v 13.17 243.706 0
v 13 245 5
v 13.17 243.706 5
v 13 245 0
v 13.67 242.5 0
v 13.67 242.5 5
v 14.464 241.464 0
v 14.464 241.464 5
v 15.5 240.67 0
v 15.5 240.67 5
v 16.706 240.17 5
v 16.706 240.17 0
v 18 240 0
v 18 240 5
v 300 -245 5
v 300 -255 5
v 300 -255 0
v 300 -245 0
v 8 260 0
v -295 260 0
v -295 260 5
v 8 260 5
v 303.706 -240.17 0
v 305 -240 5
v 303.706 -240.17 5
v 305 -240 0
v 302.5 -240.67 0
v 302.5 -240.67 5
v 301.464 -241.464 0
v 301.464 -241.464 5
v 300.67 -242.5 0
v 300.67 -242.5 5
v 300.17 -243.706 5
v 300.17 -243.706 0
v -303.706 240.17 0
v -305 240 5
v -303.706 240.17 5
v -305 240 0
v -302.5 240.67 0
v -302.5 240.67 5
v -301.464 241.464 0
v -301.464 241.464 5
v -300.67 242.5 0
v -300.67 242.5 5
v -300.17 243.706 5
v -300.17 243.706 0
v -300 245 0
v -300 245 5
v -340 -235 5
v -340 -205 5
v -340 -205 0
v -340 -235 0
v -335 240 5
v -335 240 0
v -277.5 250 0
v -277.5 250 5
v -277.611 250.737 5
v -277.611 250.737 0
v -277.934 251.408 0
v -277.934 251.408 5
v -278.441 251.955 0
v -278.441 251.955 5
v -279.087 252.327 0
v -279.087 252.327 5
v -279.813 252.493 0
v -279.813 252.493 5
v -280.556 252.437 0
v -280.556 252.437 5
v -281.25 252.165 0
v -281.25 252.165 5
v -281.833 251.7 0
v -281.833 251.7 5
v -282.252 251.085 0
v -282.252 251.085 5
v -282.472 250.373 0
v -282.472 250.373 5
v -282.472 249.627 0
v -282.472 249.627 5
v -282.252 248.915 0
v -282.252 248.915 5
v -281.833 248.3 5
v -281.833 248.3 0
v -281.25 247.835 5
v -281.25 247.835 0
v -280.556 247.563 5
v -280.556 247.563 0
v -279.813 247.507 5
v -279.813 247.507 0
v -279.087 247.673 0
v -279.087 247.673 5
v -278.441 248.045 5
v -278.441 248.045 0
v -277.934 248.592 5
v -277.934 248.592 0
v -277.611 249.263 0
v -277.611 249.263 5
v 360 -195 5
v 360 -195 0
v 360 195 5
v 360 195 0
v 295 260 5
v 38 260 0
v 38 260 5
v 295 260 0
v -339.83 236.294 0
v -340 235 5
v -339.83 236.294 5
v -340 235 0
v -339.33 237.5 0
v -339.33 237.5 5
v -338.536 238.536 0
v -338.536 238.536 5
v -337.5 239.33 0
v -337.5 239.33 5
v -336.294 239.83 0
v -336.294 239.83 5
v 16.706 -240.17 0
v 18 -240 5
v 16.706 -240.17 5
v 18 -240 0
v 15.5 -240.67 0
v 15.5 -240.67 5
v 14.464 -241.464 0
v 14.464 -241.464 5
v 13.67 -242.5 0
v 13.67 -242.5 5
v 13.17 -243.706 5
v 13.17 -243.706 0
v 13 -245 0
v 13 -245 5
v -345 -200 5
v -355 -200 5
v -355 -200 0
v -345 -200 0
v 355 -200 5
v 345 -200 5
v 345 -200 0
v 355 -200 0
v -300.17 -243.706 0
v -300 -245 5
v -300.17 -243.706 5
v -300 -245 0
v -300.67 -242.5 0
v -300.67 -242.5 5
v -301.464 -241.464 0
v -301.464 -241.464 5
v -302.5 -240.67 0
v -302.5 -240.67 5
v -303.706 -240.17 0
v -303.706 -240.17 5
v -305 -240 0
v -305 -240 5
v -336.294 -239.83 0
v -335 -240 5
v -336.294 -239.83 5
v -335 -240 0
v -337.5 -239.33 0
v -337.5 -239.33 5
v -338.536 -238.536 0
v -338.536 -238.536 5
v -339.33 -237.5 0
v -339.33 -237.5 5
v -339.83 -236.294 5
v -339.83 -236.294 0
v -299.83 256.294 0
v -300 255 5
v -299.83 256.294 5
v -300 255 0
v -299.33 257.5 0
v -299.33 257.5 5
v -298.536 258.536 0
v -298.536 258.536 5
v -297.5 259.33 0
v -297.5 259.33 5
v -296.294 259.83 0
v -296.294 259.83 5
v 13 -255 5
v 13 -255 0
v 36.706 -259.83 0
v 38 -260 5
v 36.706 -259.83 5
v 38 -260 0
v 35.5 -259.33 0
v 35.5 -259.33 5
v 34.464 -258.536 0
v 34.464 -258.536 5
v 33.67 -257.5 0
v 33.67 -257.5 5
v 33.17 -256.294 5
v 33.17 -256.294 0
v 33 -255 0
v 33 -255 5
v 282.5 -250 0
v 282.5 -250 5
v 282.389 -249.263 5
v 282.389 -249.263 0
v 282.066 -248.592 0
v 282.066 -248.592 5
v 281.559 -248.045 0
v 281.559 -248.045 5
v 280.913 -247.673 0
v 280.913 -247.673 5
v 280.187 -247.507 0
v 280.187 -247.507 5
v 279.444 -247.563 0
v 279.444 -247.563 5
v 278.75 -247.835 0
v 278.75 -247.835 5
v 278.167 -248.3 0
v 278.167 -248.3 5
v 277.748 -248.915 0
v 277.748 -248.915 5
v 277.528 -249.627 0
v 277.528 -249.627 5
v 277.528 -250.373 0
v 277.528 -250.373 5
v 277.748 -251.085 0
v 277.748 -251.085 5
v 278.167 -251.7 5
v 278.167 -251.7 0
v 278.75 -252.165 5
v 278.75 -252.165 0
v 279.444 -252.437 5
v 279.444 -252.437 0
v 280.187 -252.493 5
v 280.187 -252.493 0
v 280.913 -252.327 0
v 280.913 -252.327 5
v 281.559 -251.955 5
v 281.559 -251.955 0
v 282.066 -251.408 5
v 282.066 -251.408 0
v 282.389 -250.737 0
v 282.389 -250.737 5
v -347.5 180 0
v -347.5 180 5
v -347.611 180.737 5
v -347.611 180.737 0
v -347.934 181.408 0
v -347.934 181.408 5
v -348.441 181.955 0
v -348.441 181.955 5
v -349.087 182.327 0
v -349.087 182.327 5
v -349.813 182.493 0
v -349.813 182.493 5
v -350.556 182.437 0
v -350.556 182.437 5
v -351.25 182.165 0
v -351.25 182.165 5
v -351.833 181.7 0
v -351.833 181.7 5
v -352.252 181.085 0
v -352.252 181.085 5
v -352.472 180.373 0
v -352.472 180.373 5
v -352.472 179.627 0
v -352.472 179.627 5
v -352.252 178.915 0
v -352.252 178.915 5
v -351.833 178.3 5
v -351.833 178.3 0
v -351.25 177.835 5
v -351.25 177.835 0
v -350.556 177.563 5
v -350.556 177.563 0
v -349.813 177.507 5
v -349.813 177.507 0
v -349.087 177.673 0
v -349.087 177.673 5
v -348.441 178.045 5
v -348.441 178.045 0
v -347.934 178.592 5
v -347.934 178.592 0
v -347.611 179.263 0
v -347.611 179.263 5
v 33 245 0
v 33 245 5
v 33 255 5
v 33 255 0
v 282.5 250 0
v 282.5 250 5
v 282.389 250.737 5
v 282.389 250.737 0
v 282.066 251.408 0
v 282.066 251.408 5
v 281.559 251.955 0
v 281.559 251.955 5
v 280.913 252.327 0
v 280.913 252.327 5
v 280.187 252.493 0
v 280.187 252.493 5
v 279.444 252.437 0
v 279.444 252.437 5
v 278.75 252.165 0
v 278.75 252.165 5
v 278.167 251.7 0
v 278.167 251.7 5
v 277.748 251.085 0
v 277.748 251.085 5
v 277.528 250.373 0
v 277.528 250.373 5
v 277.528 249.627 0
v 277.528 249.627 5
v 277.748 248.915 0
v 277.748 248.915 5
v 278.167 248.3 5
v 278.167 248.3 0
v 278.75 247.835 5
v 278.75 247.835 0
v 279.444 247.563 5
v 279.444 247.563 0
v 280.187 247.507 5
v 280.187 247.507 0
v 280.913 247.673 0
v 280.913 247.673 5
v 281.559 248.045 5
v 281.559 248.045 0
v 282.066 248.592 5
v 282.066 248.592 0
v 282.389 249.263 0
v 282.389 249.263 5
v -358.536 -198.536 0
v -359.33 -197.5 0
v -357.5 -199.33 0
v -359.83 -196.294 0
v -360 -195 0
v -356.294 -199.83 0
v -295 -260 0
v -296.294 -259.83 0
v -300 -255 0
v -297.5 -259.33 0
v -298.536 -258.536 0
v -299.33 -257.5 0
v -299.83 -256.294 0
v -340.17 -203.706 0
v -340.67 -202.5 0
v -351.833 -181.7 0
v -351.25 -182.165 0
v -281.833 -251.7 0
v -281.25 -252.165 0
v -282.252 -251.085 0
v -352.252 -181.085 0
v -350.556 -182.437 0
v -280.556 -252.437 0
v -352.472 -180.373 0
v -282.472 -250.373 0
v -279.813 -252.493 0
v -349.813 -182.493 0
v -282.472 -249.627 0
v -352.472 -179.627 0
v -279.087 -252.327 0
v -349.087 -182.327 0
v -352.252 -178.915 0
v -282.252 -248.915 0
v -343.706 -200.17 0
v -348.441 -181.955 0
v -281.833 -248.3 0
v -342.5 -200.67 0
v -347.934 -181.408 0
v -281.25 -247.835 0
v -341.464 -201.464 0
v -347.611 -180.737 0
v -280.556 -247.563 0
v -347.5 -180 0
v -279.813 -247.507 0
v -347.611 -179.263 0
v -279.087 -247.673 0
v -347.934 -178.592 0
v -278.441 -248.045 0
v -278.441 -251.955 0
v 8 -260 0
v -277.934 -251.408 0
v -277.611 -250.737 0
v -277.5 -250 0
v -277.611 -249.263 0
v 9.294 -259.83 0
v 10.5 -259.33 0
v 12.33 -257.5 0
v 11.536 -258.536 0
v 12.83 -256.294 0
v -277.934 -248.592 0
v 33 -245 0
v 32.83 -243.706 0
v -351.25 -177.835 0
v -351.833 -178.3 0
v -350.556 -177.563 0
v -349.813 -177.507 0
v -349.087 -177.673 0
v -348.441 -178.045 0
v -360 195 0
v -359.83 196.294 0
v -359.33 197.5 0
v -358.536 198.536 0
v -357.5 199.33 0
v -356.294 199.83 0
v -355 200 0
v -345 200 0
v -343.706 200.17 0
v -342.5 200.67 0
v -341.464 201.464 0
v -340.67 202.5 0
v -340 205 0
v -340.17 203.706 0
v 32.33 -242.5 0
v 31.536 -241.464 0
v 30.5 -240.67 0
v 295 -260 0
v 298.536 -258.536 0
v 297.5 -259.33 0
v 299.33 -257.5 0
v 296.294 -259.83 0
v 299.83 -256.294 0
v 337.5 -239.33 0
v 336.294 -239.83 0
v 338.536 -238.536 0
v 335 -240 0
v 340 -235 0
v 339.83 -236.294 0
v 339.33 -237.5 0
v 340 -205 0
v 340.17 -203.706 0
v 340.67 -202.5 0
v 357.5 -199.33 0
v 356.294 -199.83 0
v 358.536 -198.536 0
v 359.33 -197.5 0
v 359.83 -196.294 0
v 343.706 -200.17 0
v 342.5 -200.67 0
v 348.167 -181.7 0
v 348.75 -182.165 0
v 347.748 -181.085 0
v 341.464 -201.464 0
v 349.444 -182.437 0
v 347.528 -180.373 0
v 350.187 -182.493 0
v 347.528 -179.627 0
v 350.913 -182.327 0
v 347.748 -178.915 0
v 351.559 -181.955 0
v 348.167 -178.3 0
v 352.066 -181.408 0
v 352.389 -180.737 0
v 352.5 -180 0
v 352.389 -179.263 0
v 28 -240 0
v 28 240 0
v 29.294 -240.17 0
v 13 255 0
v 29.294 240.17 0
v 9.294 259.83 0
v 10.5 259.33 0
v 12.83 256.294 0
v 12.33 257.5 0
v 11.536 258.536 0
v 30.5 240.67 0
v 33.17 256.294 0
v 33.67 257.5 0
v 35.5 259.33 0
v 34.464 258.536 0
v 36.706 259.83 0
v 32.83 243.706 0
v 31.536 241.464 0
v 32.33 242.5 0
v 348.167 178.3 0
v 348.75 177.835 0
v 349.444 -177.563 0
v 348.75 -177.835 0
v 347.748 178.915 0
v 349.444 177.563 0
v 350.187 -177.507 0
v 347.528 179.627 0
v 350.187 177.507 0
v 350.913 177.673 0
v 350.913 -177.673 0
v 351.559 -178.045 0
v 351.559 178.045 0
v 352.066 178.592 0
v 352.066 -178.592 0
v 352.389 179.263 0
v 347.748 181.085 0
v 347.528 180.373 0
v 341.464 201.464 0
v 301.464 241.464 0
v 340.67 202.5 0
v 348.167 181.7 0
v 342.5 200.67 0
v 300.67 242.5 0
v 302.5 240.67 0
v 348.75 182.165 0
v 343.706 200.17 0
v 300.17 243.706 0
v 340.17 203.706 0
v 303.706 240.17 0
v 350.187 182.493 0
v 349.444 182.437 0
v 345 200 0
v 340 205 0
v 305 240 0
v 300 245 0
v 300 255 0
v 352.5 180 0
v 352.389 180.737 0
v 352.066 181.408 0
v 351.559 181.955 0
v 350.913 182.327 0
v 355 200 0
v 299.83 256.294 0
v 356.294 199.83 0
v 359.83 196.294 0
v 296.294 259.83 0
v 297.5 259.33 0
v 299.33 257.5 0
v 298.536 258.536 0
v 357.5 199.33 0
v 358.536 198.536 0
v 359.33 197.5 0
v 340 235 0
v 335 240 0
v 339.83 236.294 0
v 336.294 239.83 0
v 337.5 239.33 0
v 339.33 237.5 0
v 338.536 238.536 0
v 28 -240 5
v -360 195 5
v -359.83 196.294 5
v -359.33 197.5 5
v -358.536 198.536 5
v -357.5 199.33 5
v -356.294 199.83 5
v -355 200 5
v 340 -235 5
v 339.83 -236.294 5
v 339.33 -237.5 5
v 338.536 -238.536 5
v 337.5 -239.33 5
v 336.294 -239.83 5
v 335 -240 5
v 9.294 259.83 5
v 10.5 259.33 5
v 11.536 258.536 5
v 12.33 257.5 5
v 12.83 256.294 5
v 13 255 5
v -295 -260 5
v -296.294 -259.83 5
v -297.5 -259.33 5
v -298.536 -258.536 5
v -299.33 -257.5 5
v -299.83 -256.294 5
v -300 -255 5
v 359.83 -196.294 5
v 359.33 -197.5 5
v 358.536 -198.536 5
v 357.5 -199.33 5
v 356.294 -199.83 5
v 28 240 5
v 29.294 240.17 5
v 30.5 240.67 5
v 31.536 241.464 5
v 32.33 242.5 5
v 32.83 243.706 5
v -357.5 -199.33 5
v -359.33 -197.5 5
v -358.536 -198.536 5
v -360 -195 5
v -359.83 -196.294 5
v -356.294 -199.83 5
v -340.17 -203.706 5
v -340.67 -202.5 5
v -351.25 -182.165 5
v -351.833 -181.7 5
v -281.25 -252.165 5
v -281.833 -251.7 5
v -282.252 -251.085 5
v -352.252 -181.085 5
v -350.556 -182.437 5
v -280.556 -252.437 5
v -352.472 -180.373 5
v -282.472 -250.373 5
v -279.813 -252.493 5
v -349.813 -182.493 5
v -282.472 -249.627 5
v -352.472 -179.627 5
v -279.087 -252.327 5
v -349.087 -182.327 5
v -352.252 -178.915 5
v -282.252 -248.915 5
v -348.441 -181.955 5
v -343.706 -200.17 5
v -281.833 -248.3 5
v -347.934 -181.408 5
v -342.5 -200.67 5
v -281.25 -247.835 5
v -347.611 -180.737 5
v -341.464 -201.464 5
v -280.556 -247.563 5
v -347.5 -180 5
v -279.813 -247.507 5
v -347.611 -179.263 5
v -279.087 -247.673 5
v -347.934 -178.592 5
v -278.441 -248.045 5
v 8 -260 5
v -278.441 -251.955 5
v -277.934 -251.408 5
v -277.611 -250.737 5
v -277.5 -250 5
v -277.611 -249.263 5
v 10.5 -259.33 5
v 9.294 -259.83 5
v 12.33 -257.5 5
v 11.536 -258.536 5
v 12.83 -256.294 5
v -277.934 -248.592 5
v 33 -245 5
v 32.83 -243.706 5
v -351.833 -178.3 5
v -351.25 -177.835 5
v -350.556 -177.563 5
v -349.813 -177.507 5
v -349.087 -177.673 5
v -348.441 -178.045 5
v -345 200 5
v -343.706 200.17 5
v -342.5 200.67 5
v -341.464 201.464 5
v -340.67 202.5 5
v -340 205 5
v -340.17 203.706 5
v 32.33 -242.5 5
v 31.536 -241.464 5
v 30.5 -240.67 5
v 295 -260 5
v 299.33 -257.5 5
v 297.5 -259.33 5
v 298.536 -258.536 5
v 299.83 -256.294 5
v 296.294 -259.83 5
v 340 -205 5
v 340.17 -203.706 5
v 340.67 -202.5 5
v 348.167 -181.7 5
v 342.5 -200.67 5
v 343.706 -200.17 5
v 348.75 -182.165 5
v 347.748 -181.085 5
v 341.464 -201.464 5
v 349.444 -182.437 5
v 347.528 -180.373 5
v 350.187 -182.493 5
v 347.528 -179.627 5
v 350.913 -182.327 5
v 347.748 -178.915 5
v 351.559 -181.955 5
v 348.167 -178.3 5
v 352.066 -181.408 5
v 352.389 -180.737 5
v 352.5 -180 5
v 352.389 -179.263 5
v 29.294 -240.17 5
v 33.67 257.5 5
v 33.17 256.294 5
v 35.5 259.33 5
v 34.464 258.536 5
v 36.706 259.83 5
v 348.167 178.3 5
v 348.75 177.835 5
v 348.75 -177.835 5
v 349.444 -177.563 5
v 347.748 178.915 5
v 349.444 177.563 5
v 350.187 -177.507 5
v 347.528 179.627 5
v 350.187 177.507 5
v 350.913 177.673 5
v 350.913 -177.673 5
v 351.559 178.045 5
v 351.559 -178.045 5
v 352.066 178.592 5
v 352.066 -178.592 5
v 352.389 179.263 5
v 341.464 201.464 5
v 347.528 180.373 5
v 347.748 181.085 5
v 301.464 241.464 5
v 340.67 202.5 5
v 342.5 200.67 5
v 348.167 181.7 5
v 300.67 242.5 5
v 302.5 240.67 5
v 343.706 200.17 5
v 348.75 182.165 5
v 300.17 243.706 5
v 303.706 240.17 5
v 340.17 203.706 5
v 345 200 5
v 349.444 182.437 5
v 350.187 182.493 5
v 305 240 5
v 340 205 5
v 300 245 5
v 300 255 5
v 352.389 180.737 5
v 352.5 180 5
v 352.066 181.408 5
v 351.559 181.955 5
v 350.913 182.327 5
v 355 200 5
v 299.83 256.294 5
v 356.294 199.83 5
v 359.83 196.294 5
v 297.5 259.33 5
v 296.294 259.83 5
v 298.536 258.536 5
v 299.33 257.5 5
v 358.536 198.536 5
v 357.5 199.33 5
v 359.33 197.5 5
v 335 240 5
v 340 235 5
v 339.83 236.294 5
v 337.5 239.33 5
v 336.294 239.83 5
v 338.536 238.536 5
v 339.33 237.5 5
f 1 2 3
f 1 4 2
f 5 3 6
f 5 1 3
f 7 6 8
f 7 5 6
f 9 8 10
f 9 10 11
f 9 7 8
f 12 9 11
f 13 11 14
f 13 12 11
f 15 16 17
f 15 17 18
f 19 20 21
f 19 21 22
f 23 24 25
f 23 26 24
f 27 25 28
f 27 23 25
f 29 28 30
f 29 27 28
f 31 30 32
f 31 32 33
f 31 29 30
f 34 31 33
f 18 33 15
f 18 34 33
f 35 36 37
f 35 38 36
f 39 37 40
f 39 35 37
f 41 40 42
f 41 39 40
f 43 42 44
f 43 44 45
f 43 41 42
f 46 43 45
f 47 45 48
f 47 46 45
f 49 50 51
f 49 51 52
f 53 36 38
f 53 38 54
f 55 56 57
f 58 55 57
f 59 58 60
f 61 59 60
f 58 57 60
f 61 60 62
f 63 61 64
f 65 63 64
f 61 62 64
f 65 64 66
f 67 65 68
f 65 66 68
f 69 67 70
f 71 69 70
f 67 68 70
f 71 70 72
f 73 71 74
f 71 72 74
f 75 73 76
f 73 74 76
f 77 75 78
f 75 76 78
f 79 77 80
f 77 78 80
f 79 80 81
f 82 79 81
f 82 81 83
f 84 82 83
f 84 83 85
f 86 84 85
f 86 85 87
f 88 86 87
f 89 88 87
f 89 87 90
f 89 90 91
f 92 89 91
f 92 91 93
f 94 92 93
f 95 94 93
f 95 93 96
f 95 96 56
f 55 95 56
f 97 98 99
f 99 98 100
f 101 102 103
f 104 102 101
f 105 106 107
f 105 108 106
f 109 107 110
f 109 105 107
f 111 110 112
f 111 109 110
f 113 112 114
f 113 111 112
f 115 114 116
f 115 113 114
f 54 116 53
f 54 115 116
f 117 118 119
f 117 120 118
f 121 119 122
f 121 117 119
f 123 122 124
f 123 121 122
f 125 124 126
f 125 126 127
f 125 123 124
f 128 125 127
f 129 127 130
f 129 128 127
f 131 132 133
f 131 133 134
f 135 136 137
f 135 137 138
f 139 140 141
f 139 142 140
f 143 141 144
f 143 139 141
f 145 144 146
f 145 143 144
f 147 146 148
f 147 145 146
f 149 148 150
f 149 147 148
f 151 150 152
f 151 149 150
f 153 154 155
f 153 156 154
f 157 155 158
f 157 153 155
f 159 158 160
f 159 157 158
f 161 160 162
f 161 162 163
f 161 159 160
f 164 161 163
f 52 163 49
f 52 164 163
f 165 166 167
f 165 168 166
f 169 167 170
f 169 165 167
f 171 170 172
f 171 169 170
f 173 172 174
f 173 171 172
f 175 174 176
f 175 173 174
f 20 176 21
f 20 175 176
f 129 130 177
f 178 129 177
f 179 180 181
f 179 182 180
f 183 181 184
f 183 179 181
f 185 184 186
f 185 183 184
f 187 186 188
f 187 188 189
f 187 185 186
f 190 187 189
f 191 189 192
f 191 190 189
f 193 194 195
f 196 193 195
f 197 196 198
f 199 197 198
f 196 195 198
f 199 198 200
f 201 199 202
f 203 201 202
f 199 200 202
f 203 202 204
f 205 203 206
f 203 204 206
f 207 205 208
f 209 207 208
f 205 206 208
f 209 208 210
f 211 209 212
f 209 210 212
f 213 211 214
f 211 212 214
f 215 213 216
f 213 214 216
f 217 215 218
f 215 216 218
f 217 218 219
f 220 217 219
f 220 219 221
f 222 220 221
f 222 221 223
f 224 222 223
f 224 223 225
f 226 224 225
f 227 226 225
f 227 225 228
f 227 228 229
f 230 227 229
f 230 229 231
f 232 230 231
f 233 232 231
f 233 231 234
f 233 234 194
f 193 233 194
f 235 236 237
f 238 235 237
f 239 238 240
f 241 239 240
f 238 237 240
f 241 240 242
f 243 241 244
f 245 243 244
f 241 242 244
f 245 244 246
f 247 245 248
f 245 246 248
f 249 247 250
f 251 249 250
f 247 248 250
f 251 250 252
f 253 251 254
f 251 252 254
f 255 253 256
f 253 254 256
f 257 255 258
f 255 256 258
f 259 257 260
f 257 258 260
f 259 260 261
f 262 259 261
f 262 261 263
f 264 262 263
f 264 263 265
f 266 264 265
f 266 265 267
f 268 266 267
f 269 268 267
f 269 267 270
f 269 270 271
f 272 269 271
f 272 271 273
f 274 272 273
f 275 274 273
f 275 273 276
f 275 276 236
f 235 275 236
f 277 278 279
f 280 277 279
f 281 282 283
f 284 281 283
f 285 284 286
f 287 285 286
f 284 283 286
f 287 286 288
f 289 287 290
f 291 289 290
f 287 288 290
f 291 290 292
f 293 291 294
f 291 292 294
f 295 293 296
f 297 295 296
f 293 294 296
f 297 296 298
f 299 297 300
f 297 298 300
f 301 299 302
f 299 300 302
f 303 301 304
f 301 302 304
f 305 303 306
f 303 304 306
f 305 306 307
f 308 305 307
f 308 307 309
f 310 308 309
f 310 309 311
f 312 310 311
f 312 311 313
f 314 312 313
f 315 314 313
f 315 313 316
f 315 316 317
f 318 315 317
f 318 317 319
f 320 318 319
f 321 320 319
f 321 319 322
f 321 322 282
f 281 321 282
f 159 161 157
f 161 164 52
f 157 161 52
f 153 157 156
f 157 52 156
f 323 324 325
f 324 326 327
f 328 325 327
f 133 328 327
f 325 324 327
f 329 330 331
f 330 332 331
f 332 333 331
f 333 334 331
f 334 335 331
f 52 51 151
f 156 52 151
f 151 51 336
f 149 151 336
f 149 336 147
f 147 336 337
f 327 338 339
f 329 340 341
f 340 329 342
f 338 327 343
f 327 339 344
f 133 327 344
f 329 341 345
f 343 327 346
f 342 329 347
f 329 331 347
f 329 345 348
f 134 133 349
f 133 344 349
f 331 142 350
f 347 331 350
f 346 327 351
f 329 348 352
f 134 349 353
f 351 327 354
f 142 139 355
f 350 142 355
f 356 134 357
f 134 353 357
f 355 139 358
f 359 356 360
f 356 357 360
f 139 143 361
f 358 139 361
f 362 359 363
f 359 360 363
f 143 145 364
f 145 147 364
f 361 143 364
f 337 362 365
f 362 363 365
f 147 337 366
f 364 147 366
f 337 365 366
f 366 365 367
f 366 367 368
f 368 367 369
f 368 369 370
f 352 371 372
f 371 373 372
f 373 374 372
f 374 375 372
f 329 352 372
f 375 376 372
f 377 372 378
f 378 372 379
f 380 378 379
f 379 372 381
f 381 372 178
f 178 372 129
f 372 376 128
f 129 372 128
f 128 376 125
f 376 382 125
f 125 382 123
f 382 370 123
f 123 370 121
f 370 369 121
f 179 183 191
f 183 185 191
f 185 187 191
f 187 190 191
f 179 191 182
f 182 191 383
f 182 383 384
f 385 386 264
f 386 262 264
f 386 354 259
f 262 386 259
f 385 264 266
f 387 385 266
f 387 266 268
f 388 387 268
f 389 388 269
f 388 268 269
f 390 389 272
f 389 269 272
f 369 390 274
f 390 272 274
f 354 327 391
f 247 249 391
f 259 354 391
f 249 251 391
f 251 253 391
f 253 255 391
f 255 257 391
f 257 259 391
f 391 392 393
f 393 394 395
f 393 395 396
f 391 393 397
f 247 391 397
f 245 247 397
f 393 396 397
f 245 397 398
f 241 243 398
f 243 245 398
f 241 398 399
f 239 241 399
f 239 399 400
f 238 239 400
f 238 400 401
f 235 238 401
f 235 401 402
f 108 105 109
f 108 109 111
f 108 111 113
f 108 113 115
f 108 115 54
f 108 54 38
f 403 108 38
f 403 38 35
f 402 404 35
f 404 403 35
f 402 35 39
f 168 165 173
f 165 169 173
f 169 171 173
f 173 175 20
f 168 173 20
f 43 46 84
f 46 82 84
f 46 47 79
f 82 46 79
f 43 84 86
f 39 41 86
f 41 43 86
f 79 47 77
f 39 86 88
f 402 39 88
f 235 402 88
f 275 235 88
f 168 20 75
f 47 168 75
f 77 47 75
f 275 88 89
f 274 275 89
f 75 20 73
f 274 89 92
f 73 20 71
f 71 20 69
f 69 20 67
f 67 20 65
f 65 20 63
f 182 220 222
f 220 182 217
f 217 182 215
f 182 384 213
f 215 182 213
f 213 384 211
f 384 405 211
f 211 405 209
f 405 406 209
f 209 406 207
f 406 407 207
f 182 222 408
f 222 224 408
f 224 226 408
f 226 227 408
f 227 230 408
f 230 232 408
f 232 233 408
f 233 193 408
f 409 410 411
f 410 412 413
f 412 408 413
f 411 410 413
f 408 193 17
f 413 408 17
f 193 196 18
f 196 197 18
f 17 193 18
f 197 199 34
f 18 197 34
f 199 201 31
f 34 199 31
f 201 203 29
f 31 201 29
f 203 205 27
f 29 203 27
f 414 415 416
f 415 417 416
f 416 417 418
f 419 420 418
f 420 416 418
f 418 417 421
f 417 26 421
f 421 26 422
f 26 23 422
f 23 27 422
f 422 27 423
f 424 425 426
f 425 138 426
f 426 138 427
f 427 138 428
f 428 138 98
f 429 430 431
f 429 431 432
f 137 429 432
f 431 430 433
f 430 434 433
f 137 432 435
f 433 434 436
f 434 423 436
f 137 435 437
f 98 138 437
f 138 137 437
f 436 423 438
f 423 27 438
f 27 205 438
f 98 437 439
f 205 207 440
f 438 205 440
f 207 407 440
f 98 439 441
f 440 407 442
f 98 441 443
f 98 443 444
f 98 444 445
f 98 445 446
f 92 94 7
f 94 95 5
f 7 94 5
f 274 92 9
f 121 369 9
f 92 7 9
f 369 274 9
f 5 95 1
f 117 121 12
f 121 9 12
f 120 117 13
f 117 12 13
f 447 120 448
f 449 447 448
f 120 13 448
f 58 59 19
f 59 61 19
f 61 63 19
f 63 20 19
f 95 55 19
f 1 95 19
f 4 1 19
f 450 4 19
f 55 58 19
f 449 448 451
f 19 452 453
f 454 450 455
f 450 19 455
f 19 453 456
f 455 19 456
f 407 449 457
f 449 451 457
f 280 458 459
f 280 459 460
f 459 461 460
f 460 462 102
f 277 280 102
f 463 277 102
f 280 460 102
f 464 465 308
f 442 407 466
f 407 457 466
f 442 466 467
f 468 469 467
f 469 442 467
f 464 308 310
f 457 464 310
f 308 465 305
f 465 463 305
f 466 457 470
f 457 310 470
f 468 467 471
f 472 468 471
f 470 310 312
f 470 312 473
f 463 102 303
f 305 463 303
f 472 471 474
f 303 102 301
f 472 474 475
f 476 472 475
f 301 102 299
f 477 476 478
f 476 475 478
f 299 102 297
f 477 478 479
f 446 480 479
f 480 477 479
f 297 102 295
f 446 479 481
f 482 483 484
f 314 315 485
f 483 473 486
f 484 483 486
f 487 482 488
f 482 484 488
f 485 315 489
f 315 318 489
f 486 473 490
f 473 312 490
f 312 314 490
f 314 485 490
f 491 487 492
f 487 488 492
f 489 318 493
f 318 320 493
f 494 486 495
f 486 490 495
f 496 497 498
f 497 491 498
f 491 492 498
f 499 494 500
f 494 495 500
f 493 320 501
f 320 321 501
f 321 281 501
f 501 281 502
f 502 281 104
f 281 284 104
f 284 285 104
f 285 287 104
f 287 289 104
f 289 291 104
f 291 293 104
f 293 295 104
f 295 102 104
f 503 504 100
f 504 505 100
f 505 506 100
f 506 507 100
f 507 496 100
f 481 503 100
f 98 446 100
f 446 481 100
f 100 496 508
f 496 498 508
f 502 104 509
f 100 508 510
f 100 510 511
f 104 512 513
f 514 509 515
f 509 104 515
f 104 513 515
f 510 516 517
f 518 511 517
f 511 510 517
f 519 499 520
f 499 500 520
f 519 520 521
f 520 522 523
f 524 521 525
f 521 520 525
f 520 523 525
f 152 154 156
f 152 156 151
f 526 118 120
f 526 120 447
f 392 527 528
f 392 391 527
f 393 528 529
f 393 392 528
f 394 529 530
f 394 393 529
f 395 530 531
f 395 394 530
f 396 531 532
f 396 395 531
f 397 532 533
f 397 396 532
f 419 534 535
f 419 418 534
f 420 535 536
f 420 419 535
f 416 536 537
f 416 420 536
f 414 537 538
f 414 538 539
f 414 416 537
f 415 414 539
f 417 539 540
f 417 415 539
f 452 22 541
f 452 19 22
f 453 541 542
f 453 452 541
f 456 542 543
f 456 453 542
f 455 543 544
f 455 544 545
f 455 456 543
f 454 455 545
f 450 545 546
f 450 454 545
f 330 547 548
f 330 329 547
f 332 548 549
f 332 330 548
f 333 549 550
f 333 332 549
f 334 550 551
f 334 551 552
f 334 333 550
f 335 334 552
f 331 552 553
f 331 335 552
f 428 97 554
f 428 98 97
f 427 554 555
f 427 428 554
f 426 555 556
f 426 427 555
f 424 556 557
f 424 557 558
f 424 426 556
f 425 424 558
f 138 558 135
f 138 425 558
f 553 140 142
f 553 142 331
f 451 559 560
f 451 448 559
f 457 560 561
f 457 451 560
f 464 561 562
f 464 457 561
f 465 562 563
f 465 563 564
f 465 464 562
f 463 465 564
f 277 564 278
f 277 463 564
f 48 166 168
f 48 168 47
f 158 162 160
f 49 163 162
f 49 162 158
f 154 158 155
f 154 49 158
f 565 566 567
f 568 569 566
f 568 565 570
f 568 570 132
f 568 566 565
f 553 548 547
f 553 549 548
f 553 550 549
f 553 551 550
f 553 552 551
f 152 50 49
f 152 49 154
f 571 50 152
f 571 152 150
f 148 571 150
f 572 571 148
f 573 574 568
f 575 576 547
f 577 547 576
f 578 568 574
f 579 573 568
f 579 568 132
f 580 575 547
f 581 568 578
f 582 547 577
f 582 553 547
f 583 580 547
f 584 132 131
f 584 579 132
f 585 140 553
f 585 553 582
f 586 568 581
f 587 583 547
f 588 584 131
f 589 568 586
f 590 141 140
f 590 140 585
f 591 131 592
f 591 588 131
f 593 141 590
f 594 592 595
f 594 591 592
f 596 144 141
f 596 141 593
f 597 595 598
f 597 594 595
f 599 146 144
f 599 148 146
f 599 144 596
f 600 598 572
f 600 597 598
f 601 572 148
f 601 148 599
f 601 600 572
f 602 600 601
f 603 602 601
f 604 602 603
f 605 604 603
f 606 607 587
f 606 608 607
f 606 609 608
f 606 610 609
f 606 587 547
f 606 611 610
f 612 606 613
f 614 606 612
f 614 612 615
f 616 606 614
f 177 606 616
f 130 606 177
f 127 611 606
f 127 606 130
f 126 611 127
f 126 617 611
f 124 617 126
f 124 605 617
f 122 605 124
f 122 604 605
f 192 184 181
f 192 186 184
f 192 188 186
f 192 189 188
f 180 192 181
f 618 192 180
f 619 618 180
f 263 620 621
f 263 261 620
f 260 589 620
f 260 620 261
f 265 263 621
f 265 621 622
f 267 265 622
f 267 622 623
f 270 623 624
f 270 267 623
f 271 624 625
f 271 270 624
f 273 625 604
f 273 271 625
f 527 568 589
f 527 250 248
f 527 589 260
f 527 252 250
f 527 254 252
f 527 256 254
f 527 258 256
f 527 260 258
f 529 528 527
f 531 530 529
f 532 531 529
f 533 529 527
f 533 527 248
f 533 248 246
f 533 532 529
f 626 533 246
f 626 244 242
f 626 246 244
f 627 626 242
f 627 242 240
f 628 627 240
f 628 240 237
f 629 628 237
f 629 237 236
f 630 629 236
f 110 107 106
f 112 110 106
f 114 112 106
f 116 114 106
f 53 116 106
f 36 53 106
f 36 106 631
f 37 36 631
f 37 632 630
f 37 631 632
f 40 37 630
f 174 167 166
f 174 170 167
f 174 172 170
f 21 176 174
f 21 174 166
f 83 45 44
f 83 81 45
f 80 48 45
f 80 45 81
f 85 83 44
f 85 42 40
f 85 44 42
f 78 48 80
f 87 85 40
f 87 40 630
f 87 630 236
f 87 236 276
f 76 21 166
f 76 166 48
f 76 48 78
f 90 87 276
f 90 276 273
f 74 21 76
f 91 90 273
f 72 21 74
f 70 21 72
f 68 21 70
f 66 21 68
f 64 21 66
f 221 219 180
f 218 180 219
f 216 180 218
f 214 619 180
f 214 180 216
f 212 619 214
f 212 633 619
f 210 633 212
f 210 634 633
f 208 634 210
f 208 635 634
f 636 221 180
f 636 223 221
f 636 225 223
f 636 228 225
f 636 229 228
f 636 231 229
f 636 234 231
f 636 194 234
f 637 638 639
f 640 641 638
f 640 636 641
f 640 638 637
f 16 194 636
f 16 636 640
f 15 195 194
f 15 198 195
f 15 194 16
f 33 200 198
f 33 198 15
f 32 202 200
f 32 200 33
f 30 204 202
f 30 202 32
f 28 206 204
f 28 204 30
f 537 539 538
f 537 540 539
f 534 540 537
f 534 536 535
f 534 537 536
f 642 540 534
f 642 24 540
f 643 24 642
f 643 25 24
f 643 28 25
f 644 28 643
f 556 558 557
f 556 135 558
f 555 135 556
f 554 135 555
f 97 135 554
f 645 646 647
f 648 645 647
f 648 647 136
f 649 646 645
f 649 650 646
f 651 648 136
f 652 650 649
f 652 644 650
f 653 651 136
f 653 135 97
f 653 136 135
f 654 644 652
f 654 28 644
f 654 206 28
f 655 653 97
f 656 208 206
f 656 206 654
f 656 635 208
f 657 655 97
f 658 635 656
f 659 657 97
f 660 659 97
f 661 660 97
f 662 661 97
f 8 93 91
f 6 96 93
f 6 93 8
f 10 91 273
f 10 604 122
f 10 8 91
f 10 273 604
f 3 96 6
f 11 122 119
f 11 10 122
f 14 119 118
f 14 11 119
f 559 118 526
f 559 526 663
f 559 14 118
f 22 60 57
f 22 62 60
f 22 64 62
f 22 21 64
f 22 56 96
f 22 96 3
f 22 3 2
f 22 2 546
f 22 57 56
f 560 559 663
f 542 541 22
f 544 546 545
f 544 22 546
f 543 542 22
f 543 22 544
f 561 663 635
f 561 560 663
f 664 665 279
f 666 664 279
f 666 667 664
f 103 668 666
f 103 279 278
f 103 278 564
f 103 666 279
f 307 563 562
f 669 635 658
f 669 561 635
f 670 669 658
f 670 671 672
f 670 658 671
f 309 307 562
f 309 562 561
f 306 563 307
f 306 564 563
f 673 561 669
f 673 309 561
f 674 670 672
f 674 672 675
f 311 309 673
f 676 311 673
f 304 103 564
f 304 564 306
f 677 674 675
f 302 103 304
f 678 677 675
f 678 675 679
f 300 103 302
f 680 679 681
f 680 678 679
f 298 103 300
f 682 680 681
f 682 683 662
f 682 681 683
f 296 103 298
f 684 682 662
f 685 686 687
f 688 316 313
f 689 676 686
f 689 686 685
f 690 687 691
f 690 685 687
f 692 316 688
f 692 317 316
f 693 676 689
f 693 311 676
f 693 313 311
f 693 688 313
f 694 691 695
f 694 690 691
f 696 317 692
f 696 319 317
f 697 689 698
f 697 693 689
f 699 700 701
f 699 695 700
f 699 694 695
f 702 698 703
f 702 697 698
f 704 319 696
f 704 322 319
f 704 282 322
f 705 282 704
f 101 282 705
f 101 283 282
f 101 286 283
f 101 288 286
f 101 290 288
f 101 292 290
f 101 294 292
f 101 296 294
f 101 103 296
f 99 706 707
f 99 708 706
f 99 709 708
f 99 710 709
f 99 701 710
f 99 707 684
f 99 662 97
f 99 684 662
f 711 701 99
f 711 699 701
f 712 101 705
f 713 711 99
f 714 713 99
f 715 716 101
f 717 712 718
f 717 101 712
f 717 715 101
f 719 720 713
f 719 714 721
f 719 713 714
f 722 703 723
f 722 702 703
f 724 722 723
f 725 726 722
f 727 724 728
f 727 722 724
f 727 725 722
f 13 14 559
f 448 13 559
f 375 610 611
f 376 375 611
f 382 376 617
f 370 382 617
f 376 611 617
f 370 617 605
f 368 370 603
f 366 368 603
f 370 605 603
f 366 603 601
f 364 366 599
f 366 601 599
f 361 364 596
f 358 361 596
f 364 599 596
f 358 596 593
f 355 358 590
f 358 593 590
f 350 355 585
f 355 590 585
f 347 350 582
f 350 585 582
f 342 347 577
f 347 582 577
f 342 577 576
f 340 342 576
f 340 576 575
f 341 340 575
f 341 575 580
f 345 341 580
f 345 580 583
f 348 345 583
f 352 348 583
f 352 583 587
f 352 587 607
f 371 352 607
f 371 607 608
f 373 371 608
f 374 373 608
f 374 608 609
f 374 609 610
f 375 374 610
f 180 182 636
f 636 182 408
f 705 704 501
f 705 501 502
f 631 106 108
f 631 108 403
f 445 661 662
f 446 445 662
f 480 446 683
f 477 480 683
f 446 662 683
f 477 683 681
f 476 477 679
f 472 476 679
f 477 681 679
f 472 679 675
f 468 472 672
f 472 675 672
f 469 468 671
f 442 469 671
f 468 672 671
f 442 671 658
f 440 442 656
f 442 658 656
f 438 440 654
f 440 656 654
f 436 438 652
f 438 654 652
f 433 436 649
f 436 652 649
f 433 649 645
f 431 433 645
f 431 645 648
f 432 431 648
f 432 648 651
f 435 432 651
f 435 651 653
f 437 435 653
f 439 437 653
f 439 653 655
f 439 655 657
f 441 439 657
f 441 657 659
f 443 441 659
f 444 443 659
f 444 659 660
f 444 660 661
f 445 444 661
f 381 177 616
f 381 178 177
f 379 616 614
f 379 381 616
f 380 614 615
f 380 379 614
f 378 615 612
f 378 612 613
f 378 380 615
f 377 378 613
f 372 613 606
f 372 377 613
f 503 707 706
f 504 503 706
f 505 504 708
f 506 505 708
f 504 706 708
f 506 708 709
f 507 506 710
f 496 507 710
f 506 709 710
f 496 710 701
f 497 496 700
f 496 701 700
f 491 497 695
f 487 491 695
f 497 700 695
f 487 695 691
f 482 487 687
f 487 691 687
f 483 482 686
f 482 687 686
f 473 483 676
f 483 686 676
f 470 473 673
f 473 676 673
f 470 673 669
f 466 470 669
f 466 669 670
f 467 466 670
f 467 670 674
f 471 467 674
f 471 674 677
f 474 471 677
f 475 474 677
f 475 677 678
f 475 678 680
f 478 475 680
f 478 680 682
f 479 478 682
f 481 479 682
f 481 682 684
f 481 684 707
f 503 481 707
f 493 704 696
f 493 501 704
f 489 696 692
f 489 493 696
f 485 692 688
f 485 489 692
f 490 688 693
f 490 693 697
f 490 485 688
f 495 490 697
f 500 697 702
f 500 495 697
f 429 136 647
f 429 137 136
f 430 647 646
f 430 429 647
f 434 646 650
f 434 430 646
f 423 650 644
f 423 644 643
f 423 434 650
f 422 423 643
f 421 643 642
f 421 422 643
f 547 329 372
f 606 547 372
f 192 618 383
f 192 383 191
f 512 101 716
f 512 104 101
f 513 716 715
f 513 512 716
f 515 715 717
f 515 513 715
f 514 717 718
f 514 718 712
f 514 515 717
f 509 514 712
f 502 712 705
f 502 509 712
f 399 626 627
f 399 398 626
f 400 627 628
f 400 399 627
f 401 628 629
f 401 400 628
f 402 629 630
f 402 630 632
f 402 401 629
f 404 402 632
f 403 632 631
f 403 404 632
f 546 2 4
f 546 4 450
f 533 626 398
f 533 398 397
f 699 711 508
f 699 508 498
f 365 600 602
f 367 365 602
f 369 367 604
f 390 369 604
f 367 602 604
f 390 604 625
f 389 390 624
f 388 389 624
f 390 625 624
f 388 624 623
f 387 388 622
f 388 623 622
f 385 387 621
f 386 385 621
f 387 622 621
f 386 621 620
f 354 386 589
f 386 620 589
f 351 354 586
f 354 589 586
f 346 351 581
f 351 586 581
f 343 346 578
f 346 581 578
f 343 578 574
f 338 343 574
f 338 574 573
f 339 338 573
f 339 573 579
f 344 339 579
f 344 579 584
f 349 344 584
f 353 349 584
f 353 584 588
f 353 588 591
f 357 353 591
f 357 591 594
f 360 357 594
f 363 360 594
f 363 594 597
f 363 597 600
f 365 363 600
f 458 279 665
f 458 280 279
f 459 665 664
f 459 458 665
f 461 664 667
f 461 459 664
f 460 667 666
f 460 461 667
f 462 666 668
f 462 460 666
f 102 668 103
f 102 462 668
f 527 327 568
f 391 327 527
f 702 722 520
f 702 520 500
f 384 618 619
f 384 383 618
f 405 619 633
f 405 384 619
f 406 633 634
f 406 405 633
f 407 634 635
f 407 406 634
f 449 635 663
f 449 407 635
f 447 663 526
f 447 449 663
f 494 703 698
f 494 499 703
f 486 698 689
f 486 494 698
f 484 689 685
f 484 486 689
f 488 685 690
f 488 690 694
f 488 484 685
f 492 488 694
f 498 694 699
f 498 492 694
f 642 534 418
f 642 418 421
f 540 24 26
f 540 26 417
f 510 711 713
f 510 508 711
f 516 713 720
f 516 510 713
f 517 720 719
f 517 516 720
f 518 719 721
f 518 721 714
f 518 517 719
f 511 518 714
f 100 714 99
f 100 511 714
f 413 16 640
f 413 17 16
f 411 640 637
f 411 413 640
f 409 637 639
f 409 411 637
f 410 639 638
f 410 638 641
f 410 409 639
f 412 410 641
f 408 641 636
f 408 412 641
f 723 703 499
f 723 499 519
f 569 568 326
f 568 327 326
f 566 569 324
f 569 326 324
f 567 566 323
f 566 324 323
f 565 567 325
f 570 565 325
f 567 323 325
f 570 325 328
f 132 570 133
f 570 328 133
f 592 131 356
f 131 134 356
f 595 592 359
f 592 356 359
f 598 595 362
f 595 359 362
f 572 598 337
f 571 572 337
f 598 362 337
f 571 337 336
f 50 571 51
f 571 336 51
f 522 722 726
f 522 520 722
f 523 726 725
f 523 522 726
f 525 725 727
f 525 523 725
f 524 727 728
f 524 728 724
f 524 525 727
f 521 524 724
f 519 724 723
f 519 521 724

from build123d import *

# Parameters (mm, degrees)
SKETCH_1_W          = 720
SKETCH_1_H          = 520
EXTRUDE_1_DEPTH     = 5
CUT_EXTRUDE_1_DEPTH = 445.100213916
SKETCH_3_R          = 2.5
CUT_EXTRUDE_2_DEPTH = 445.100213916
SKETCH_4_W          = 20
SKETCH_4_H          = 20
CUT_EXTRUDE_3_DEPTH = 10
FILLET_1_R          = 5


with BuildPart() as part:
    # 草图1 → 凸台-拉伸1 (new body)
    with BuildSketch(Plane.XY):
        Rectangle(SKETCH_1_W, SKETCH_1_H)
    extrude(amount=EXTRUDE_1_DEPTH)

    # 草图2 → 切除-拉伸1 (cut, through all)
    with BuildSketch(Plane.XY.offset(5)):
        Polygon((340, -240), (340, -200), (360, -200), (360, -260), (300, -260), (300, -240), align=None)
        Polygon((340, 240), (300, 240), (300, 260), (360, 260), (360, 200), (340, 200), align=None)
        Polygon((-340, 240), (-340, 200), (-360, 200), (-360, 260), (-300, 260), (-300, 240), align=None)
        Polygon((-340, -240), (-300, -240), (-300, -260), (-360, -260), (-360, -200), (-340, -200), align=None)
    extrude(amount=-CUT_EXTRUDE_1_DEPTH, mode=Mode.SUBTRACT)

    # 草图3 → 切除-拉伸2 (cut, through all)
    with BuildSketch(Plane.XY.offset(5)):
        with Locations((350, 180)):
            Circle(SKETCH_3_R)
        with Locations((280, 250)):
            Circle(SKETCH_3_R)
        with Locations((-280, 250)):
            Circle(SKETCH_3_R)
        with Locations((-350, 180)):
            Circle(SKETCH_3_R)
        with Locations((-350, -180)):
            Circle(SKETCH_3_R)
        with Locations((-280, -250)):
            Circle(SKETCH_3_R)
        with Locations((350, -180)):
            Circle(SKETCH_3_R)
        with Locations((280, -250)):
            Circle(SKETCH_3_R)
    extrude(amount=-CUT_EXTRUDE_2_DEPTH, mode=Mode.SUBTRACT)

    # 草图4 → 切除-拉伸3 (cut)
    with BuildSketch(Plane.XY.offset(5)):
        with Locations((23, 250)):
            Rectangle(SKETCH_4_W, SKETCH_4_H)
    cut_extrude_3 = extrude(amount=-CUT_EXTRUDE_3_DEPTH, mode=Mode.SUBTRACT)

    # 镜向2: 切除-拉伸3 across plane
    add(cut_extrude_3.mirror(Plane.ZX), mode=Mode.SUBTRACT)

    # 圆角1
    fillet_1_edges = [part.edges().sort_by_distance(p)[0] for p in [
        (13, 260, 2.5),
        (33, 260, 2.5),
        (33, 240, 2.5),
        (13, 240, 2.5),
        (33, -260, 2.5),
        (13, -260, 2.5),
        (13, -240, 2.5),
        (33, -240, 2.5),
        (-360, -200, 2.5),
        (-340, -200, 2.5),
        (-340, -240, 2.5),
        (-300, -240, 2.5),
        (-300, -260, 2.5),
        (-300, 260, 2.5),
        (-300, 240, 2.5),
        (-340, 240, 2.5),
        (-340, 200, 2.5),
        (-360, 200, 2.5),
        (360, 200, 2.5),
        (340, 200, 2.5),
        (340, 240, 2.5),
        (300, 240, 2.5),
        (300, 260, 2.5),
        (300, -260, 2.5),
        (300, -240, 2.5),
        (340, -240, 2.5),
        (340, -200, 2.5),
        (360, -200, 2.5),
    ]]
    fillet(fillet_1_edges, radius=FILLET_1_R)


solid = part.part
